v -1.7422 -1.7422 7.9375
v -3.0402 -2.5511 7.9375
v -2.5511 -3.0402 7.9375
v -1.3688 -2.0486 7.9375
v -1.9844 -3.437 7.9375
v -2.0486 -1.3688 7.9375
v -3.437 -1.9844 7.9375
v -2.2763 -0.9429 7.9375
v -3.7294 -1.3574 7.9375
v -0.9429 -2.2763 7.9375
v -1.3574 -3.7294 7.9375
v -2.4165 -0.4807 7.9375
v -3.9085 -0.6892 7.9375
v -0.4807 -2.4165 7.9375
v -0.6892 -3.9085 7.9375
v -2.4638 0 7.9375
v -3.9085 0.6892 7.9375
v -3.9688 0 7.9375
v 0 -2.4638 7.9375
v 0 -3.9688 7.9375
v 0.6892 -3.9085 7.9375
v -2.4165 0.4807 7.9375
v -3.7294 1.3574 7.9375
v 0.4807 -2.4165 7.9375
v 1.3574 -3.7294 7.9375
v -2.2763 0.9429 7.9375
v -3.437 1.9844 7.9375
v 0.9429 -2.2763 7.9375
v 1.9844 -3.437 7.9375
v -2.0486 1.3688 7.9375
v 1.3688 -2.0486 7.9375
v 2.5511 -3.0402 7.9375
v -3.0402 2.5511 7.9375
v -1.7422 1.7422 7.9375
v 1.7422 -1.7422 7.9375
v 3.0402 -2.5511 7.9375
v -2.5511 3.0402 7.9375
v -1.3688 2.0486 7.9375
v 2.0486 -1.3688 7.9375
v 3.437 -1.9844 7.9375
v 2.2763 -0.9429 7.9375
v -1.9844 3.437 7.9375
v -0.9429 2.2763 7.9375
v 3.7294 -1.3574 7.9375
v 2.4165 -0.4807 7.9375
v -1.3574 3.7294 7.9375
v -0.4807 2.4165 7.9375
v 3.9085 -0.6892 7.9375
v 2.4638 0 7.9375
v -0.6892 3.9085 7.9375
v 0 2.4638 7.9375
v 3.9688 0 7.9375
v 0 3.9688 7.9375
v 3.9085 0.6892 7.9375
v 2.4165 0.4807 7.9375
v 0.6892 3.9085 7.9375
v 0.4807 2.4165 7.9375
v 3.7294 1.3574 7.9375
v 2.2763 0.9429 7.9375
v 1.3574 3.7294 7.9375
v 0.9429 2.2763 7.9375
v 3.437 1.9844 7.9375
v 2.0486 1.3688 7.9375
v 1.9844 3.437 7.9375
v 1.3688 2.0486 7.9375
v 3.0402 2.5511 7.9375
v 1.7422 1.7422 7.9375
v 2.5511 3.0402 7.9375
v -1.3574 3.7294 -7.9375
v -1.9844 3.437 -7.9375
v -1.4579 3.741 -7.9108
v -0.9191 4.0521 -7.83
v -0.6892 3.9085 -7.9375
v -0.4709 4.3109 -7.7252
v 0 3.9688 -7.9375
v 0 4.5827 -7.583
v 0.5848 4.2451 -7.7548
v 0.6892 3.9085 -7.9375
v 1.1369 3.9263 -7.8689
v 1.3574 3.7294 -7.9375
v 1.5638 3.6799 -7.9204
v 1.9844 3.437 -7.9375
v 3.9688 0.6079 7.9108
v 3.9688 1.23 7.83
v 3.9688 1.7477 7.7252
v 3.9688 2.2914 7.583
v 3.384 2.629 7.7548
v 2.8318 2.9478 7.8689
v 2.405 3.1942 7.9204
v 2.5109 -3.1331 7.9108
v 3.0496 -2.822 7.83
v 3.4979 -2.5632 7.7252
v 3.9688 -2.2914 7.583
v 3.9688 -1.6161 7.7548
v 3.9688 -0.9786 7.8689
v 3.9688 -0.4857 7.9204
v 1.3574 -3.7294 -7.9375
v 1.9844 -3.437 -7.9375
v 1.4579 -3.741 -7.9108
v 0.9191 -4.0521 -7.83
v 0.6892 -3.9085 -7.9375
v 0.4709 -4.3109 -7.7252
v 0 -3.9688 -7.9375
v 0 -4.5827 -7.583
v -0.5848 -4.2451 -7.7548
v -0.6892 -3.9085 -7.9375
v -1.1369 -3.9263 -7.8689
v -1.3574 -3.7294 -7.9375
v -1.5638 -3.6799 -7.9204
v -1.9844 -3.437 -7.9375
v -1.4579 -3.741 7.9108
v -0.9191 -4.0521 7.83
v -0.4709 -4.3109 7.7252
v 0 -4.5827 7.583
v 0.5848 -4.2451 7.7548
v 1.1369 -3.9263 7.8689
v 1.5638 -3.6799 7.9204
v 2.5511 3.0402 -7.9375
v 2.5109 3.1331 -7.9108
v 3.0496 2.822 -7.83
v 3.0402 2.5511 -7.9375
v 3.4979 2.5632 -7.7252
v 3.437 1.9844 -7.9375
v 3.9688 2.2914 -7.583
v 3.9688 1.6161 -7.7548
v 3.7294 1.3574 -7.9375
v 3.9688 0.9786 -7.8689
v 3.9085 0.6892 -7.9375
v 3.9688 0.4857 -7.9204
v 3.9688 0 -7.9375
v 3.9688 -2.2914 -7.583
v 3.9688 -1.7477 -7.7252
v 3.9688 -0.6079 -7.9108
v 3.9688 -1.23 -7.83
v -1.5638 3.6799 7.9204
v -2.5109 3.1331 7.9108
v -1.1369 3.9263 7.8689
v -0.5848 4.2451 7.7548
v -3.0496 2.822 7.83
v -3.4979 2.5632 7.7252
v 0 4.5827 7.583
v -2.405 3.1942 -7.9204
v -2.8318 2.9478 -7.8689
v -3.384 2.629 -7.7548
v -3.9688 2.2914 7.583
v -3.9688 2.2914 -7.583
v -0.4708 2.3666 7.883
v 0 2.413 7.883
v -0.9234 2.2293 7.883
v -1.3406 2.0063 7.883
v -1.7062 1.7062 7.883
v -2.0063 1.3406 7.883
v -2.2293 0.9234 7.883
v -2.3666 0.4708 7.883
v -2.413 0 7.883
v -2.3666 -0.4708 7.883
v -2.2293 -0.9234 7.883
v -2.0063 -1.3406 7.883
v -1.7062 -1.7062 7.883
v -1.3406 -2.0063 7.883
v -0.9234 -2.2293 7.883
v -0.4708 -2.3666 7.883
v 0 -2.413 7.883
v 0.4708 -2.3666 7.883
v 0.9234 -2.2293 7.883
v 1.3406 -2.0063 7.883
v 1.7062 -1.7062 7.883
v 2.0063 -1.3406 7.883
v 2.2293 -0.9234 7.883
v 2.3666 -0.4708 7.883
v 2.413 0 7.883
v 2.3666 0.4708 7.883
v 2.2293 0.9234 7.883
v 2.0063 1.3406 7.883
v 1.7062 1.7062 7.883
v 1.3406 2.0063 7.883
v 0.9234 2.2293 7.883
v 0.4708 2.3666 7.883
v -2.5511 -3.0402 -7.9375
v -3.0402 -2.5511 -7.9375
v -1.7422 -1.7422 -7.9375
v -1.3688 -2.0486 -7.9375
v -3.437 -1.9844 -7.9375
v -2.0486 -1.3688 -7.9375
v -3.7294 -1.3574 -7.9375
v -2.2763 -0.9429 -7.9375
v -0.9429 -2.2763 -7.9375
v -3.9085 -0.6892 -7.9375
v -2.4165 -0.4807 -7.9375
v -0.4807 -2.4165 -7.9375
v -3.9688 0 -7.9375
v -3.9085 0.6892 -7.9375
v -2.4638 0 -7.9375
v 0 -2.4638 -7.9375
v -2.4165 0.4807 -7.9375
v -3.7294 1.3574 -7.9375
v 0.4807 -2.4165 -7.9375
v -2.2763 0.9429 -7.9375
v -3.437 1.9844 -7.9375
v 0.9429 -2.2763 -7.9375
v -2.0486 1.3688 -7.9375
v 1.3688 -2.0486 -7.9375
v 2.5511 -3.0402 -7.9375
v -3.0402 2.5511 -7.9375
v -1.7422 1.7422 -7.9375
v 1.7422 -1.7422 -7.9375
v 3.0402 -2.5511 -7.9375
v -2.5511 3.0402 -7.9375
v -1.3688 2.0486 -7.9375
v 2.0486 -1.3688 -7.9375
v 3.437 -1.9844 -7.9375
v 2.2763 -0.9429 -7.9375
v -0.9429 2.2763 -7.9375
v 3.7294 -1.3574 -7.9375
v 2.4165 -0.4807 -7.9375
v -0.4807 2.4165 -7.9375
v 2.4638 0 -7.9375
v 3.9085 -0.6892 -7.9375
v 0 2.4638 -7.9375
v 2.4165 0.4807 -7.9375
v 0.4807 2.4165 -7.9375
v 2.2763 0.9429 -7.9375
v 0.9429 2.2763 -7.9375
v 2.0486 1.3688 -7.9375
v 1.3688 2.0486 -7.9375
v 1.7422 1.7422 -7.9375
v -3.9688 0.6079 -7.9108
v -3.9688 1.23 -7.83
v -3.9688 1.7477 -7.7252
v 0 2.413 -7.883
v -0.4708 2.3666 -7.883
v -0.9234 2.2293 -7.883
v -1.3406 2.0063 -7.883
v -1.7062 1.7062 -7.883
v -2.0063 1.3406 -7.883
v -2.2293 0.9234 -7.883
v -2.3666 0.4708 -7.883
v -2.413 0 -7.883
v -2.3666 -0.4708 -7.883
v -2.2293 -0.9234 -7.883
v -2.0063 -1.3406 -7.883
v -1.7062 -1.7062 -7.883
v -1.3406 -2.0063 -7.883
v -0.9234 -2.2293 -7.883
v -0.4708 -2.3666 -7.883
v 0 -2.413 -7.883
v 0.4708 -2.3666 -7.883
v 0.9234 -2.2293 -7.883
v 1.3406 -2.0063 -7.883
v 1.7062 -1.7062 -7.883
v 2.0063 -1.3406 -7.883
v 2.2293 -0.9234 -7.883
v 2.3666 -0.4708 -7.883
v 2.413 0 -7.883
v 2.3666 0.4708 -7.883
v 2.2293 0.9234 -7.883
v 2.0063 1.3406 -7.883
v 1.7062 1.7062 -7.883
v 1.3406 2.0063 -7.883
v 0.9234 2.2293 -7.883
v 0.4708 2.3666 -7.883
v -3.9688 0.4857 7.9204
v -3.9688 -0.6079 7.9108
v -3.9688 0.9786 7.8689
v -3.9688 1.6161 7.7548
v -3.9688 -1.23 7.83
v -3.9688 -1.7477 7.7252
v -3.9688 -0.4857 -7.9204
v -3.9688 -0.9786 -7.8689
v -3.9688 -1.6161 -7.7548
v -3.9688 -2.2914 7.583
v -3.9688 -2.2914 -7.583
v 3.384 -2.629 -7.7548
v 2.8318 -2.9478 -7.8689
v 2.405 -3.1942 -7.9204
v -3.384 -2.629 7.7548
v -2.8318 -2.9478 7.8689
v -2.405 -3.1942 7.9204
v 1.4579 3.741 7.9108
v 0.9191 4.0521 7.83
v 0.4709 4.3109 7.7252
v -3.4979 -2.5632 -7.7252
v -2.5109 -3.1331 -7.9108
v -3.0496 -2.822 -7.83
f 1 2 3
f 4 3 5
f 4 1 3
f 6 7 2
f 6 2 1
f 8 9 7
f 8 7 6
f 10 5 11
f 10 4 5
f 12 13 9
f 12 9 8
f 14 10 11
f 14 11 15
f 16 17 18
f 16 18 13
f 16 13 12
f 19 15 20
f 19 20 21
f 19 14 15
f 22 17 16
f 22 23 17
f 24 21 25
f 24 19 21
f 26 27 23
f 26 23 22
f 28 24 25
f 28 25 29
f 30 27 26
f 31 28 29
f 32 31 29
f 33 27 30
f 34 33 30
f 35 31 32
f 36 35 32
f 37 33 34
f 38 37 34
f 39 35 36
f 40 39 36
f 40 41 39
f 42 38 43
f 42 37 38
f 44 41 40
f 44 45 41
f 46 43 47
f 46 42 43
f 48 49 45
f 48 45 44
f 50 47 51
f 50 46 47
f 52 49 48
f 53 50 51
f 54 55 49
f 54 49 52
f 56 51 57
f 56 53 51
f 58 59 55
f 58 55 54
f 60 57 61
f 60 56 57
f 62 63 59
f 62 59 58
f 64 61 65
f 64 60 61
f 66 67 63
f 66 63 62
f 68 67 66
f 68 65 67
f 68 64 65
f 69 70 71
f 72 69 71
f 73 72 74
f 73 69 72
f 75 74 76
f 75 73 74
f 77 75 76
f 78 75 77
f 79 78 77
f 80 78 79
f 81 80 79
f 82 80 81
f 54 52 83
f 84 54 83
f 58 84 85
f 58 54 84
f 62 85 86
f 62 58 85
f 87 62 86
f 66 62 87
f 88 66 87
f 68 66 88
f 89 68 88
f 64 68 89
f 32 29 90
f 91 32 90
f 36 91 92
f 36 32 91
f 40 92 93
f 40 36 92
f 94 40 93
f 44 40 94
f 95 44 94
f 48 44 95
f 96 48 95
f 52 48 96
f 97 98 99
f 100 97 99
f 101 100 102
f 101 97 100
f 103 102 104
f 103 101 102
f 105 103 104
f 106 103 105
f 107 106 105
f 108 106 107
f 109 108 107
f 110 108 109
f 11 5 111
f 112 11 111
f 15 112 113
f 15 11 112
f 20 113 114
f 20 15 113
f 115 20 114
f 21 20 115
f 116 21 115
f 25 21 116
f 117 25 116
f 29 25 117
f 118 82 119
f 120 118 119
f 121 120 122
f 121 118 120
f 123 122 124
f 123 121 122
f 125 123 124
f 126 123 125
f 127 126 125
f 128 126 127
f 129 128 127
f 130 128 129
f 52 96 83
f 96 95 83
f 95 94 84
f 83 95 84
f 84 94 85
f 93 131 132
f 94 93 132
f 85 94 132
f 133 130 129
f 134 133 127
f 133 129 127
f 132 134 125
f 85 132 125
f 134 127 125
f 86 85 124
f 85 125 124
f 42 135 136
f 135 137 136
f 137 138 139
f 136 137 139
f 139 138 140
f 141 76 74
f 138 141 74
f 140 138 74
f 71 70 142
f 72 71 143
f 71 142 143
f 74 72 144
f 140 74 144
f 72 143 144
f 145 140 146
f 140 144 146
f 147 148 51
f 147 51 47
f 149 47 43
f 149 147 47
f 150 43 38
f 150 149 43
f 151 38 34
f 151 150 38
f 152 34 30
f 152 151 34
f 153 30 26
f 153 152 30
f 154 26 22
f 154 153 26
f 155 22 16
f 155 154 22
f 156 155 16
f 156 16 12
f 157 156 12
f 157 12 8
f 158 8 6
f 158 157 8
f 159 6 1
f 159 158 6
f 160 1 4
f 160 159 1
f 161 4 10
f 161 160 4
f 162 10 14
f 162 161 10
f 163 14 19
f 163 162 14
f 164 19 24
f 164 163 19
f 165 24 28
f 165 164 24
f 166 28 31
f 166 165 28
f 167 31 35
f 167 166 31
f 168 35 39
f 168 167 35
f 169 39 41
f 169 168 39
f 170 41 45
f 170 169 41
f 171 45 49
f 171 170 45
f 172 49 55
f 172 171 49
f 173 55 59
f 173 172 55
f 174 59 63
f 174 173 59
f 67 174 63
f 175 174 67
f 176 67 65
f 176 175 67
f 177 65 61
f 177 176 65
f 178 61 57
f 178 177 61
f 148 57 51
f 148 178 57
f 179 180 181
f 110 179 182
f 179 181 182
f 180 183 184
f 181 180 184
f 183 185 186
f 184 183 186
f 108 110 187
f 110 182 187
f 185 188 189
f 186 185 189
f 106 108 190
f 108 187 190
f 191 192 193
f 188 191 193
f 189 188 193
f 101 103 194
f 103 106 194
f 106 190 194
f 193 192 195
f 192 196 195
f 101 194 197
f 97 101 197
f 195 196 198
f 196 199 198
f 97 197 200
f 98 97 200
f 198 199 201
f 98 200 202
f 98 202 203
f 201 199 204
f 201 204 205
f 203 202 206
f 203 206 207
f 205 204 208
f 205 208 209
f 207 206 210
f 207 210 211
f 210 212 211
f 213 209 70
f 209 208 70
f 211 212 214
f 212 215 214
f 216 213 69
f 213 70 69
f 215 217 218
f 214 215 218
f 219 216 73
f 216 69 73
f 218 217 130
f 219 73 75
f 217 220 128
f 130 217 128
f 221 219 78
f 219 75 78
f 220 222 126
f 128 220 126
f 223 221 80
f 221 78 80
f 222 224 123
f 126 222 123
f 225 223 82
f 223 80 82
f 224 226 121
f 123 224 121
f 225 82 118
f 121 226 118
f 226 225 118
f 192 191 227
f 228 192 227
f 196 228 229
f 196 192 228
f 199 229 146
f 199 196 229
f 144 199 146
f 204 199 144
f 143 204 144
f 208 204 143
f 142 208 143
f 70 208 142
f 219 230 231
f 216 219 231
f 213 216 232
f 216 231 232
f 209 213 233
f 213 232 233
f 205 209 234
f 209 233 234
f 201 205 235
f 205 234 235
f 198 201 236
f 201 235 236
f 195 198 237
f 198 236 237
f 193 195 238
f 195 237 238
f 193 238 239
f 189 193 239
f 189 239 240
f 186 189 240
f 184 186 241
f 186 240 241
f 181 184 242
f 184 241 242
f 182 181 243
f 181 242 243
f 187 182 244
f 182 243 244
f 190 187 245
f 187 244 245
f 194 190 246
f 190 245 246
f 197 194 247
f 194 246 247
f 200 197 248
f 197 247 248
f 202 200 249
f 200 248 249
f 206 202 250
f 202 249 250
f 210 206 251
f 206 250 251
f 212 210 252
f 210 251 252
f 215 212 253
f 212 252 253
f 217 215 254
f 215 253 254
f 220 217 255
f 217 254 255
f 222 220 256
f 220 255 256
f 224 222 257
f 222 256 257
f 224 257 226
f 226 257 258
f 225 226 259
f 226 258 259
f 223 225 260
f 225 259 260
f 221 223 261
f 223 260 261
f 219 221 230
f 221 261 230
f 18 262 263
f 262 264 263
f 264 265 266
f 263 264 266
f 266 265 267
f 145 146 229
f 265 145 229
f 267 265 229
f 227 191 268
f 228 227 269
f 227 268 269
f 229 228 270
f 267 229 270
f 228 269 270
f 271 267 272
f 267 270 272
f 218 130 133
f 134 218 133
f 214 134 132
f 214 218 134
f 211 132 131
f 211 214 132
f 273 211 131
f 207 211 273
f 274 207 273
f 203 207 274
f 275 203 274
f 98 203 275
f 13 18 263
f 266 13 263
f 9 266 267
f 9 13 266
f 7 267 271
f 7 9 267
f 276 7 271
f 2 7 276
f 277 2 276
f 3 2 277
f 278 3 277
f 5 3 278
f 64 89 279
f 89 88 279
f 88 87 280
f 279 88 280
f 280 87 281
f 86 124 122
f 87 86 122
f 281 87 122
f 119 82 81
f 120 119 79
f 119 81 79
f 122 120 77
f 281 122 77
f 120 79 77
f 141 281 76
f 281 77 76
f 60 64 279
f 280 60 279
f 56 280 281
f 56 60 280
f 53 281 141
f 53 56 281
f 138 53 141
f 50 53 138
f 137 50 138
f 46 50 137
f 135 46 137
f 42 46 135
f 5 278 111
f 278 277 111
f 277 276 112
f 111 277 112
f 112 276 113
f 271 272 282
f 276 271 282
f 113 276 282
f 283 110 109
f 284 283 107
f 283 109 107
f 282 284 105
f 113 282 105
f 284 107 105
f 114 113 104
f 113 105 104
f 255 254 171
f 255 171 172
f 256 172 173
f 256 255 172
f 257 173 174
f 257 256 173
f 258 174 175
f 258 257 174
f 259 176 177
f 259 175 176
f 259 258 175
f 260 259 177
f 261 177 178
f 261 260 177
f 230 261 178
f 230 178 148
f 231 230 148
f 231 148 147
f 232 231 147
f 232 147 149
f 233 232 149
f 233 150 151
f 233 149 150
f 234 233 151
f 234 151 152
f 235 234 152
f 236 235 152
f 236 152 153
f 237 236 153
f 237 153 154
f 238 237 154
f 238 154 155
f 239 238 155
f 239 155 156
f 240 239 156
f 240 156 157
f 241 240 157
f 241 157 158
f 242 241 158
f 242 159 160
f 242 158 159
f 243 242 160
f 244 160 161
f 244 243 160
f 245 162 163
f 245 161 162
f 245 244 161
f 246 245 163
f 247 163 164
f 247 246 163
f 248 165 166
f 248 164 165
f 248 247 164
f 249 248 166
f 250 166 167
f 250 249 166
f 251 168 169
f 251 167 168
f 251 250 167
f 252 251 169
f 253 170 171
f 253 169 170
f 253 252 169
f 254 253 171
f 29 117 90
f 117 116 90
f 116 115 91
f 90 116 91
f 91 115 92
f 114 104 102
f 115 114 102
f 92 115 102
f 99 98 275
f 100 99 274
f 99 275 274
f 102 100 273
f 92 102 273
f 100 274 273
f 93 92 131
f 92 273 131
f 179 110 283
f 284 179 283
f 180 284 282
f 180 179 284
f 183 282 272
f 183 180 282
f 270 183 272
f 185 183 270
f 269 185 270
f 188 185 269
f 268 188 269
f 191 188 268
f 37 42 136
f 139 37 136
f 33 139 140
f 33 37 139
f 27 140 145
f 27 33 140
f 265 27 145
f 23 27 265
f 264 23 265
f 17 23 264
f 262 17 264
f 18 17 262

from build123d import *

# Parameters (mm, degrees)
EXTRUDE1_DEPTH          = 7.9375
EXTRUDE1_DEPTH_BACK     = 7.9375
SKETCH1_R               = 2.413
SKETCH8_OUTSIDE_W       = 76.264
SKETCH8_OUTSIDE_H       = 77.492
SKETCH8_OUTSIDE_R       = 3.96875
EXTRUDE4_DEPTH          = 17.993172266
EXTRUDE4_DRAFT          = -60
MIRROR1_COPY_1_SKETCH_W = 76.264
MIRROR1_COPY_1_SKETCH_H = 77.492
MIRROR1_COPY_1_SKETCH_R = 3.96875
MIRROR1_COPY_1_DEPTH    = 17.993172266
MIRROR1_COPY_1_DRAFT    = -60


with BuildPart() as part:
    # Sketch1 → Extrude1 (new, two sides: drawn at the far end of the back side and taken through both)
    with BuildSketch(Plane.XY.offset(-EXTRUDE1_DEPTH_BACK)):
        Polygon((0, 4.582717762), (-3.96875, 2.291358881), (-3.96875, -2.291358881), (0, -4.582717762), (3.96875, -2.291358881), (3.96875, 2.291358881), align=None)
        Circle(SKETCH1_R, mode=Mode.SUBTRACT)
    extrude(amount=EXTRUDE1_DEPTH + EXTRUDE1_DEPTH_BACK)

    # Extrude3 cone 1 section (through the dimple's axis) → Extrude3 (revolve, cut)
    with BuildSketch(Plane(origin=(0, 0, -7.9375), x_dir=(0, 1, 0), z_dir=(1, 0, 0))):
        Polygon((0, 0), (2.4638, 0), (0, 2.642102028), align=None)
    extrude3 = revolve(axis=Axis((0, 0, -7.9375), (0, 0, 1)), mode=Mode.SUBTRACT)


with BuildPart() as extrude4_tool:
    # Sketch8 outside → Extrude4 (with draft: the straight prism first)
    with BuildSketch(Plane(origin=(0, 0, -7.9375), x_dir=(-1, 0, 0), z_dir=(0, 0, -1))):
        Rectangle(SKETCH8_OUTSIDE_W, SKETCH8_OUTSIDE_H)
        Circle(SKETCH8_OUTSIDE_R, mode=Mode.SUBTRACT)
    extrude(amount=-EXTRUDE4_DEPTH)
    # Extrude4: the draft: its side faces are tilted about the plane it starts from
    extrude4_sides = [extrude4_tool.faces().sort_by_distance(p)[0] for p in [
        (0, -38.746, 1.059086133),
        (-38.132, 0, 1.059086133),
        (0, 38.746, 1.059086133),
        (38.132, 0, 1.059086133),
        (3.96875, 0, 1.059086133),
    ]]
    draft(extrude4_sides, Plane(origin=(0, 0, -7.9375), x_dir=(-1, 0, 0), z_dir=(0, 0, -1)), EXTRUDE4_DRAFT)


with BuildPart() as part_1:
    add(part.part)

    # Extrude4: cut by extrude4_tool
    add(extrude4_tool.part, mode=Mode.SUBTRACT)

    # Mirror1: Extrude3 across plane
    add(extrude3.mirror(Plane.XY), mode=Mode.SUBTRACT)


with BuildPart() as mirror1_copy_1_tool:
    # Mirror1 copy 1 sketch → Mirror1 copy 1 (with draft: the straight prism first)
    with BuildSketch(Plane(origin=(0, 0, 7.9375), x_dir=(-1, 0, 0), z_dir=(0, 0, 1))):
        Rectangle(MIRROR1_COPY_1_SKETCH_W, MIRROR1_COPY_1_SKETCH_H)
        Circle(MIRROR1_COPY_1_SKETCH_R, mode=Mode.SUBTRACT)
    extrude(amount=-MIRROR1_COPY_1_DEPTH)
    # Mirror1 copy 1: the draft: its side faces are tilted about the plane it starts from
    mirror1_copy_1_sides = [mirror1_copy_1_tool.faces().sort_by_distance(p)[0] for p in [
        (0, -38.746, -1.059086133),
        (-38.132, 0, -1.059086133),
        (0, 38.746, -1.059086133),
        (38.132, 0, -1.059086133),
        (3.96875, 0, -1.059086133),
    ]]
    draft(mirror1_copy_1_sides, Plane(origin=(0, 0, 7.9375), x_dir=(-1, 0, 0), z_dir=(0, 0, 1)), MIRROR1_COPY_1_DRAFT)


with BuildPart() as part_2:
    add(part_1.part)

    # Mirror1 copy 1: cut by mirror1_copy_1_tool
    add(mirror1_copy_1_tool.part, mode=Mode.SUBTRACT)


solid = part_2.part
